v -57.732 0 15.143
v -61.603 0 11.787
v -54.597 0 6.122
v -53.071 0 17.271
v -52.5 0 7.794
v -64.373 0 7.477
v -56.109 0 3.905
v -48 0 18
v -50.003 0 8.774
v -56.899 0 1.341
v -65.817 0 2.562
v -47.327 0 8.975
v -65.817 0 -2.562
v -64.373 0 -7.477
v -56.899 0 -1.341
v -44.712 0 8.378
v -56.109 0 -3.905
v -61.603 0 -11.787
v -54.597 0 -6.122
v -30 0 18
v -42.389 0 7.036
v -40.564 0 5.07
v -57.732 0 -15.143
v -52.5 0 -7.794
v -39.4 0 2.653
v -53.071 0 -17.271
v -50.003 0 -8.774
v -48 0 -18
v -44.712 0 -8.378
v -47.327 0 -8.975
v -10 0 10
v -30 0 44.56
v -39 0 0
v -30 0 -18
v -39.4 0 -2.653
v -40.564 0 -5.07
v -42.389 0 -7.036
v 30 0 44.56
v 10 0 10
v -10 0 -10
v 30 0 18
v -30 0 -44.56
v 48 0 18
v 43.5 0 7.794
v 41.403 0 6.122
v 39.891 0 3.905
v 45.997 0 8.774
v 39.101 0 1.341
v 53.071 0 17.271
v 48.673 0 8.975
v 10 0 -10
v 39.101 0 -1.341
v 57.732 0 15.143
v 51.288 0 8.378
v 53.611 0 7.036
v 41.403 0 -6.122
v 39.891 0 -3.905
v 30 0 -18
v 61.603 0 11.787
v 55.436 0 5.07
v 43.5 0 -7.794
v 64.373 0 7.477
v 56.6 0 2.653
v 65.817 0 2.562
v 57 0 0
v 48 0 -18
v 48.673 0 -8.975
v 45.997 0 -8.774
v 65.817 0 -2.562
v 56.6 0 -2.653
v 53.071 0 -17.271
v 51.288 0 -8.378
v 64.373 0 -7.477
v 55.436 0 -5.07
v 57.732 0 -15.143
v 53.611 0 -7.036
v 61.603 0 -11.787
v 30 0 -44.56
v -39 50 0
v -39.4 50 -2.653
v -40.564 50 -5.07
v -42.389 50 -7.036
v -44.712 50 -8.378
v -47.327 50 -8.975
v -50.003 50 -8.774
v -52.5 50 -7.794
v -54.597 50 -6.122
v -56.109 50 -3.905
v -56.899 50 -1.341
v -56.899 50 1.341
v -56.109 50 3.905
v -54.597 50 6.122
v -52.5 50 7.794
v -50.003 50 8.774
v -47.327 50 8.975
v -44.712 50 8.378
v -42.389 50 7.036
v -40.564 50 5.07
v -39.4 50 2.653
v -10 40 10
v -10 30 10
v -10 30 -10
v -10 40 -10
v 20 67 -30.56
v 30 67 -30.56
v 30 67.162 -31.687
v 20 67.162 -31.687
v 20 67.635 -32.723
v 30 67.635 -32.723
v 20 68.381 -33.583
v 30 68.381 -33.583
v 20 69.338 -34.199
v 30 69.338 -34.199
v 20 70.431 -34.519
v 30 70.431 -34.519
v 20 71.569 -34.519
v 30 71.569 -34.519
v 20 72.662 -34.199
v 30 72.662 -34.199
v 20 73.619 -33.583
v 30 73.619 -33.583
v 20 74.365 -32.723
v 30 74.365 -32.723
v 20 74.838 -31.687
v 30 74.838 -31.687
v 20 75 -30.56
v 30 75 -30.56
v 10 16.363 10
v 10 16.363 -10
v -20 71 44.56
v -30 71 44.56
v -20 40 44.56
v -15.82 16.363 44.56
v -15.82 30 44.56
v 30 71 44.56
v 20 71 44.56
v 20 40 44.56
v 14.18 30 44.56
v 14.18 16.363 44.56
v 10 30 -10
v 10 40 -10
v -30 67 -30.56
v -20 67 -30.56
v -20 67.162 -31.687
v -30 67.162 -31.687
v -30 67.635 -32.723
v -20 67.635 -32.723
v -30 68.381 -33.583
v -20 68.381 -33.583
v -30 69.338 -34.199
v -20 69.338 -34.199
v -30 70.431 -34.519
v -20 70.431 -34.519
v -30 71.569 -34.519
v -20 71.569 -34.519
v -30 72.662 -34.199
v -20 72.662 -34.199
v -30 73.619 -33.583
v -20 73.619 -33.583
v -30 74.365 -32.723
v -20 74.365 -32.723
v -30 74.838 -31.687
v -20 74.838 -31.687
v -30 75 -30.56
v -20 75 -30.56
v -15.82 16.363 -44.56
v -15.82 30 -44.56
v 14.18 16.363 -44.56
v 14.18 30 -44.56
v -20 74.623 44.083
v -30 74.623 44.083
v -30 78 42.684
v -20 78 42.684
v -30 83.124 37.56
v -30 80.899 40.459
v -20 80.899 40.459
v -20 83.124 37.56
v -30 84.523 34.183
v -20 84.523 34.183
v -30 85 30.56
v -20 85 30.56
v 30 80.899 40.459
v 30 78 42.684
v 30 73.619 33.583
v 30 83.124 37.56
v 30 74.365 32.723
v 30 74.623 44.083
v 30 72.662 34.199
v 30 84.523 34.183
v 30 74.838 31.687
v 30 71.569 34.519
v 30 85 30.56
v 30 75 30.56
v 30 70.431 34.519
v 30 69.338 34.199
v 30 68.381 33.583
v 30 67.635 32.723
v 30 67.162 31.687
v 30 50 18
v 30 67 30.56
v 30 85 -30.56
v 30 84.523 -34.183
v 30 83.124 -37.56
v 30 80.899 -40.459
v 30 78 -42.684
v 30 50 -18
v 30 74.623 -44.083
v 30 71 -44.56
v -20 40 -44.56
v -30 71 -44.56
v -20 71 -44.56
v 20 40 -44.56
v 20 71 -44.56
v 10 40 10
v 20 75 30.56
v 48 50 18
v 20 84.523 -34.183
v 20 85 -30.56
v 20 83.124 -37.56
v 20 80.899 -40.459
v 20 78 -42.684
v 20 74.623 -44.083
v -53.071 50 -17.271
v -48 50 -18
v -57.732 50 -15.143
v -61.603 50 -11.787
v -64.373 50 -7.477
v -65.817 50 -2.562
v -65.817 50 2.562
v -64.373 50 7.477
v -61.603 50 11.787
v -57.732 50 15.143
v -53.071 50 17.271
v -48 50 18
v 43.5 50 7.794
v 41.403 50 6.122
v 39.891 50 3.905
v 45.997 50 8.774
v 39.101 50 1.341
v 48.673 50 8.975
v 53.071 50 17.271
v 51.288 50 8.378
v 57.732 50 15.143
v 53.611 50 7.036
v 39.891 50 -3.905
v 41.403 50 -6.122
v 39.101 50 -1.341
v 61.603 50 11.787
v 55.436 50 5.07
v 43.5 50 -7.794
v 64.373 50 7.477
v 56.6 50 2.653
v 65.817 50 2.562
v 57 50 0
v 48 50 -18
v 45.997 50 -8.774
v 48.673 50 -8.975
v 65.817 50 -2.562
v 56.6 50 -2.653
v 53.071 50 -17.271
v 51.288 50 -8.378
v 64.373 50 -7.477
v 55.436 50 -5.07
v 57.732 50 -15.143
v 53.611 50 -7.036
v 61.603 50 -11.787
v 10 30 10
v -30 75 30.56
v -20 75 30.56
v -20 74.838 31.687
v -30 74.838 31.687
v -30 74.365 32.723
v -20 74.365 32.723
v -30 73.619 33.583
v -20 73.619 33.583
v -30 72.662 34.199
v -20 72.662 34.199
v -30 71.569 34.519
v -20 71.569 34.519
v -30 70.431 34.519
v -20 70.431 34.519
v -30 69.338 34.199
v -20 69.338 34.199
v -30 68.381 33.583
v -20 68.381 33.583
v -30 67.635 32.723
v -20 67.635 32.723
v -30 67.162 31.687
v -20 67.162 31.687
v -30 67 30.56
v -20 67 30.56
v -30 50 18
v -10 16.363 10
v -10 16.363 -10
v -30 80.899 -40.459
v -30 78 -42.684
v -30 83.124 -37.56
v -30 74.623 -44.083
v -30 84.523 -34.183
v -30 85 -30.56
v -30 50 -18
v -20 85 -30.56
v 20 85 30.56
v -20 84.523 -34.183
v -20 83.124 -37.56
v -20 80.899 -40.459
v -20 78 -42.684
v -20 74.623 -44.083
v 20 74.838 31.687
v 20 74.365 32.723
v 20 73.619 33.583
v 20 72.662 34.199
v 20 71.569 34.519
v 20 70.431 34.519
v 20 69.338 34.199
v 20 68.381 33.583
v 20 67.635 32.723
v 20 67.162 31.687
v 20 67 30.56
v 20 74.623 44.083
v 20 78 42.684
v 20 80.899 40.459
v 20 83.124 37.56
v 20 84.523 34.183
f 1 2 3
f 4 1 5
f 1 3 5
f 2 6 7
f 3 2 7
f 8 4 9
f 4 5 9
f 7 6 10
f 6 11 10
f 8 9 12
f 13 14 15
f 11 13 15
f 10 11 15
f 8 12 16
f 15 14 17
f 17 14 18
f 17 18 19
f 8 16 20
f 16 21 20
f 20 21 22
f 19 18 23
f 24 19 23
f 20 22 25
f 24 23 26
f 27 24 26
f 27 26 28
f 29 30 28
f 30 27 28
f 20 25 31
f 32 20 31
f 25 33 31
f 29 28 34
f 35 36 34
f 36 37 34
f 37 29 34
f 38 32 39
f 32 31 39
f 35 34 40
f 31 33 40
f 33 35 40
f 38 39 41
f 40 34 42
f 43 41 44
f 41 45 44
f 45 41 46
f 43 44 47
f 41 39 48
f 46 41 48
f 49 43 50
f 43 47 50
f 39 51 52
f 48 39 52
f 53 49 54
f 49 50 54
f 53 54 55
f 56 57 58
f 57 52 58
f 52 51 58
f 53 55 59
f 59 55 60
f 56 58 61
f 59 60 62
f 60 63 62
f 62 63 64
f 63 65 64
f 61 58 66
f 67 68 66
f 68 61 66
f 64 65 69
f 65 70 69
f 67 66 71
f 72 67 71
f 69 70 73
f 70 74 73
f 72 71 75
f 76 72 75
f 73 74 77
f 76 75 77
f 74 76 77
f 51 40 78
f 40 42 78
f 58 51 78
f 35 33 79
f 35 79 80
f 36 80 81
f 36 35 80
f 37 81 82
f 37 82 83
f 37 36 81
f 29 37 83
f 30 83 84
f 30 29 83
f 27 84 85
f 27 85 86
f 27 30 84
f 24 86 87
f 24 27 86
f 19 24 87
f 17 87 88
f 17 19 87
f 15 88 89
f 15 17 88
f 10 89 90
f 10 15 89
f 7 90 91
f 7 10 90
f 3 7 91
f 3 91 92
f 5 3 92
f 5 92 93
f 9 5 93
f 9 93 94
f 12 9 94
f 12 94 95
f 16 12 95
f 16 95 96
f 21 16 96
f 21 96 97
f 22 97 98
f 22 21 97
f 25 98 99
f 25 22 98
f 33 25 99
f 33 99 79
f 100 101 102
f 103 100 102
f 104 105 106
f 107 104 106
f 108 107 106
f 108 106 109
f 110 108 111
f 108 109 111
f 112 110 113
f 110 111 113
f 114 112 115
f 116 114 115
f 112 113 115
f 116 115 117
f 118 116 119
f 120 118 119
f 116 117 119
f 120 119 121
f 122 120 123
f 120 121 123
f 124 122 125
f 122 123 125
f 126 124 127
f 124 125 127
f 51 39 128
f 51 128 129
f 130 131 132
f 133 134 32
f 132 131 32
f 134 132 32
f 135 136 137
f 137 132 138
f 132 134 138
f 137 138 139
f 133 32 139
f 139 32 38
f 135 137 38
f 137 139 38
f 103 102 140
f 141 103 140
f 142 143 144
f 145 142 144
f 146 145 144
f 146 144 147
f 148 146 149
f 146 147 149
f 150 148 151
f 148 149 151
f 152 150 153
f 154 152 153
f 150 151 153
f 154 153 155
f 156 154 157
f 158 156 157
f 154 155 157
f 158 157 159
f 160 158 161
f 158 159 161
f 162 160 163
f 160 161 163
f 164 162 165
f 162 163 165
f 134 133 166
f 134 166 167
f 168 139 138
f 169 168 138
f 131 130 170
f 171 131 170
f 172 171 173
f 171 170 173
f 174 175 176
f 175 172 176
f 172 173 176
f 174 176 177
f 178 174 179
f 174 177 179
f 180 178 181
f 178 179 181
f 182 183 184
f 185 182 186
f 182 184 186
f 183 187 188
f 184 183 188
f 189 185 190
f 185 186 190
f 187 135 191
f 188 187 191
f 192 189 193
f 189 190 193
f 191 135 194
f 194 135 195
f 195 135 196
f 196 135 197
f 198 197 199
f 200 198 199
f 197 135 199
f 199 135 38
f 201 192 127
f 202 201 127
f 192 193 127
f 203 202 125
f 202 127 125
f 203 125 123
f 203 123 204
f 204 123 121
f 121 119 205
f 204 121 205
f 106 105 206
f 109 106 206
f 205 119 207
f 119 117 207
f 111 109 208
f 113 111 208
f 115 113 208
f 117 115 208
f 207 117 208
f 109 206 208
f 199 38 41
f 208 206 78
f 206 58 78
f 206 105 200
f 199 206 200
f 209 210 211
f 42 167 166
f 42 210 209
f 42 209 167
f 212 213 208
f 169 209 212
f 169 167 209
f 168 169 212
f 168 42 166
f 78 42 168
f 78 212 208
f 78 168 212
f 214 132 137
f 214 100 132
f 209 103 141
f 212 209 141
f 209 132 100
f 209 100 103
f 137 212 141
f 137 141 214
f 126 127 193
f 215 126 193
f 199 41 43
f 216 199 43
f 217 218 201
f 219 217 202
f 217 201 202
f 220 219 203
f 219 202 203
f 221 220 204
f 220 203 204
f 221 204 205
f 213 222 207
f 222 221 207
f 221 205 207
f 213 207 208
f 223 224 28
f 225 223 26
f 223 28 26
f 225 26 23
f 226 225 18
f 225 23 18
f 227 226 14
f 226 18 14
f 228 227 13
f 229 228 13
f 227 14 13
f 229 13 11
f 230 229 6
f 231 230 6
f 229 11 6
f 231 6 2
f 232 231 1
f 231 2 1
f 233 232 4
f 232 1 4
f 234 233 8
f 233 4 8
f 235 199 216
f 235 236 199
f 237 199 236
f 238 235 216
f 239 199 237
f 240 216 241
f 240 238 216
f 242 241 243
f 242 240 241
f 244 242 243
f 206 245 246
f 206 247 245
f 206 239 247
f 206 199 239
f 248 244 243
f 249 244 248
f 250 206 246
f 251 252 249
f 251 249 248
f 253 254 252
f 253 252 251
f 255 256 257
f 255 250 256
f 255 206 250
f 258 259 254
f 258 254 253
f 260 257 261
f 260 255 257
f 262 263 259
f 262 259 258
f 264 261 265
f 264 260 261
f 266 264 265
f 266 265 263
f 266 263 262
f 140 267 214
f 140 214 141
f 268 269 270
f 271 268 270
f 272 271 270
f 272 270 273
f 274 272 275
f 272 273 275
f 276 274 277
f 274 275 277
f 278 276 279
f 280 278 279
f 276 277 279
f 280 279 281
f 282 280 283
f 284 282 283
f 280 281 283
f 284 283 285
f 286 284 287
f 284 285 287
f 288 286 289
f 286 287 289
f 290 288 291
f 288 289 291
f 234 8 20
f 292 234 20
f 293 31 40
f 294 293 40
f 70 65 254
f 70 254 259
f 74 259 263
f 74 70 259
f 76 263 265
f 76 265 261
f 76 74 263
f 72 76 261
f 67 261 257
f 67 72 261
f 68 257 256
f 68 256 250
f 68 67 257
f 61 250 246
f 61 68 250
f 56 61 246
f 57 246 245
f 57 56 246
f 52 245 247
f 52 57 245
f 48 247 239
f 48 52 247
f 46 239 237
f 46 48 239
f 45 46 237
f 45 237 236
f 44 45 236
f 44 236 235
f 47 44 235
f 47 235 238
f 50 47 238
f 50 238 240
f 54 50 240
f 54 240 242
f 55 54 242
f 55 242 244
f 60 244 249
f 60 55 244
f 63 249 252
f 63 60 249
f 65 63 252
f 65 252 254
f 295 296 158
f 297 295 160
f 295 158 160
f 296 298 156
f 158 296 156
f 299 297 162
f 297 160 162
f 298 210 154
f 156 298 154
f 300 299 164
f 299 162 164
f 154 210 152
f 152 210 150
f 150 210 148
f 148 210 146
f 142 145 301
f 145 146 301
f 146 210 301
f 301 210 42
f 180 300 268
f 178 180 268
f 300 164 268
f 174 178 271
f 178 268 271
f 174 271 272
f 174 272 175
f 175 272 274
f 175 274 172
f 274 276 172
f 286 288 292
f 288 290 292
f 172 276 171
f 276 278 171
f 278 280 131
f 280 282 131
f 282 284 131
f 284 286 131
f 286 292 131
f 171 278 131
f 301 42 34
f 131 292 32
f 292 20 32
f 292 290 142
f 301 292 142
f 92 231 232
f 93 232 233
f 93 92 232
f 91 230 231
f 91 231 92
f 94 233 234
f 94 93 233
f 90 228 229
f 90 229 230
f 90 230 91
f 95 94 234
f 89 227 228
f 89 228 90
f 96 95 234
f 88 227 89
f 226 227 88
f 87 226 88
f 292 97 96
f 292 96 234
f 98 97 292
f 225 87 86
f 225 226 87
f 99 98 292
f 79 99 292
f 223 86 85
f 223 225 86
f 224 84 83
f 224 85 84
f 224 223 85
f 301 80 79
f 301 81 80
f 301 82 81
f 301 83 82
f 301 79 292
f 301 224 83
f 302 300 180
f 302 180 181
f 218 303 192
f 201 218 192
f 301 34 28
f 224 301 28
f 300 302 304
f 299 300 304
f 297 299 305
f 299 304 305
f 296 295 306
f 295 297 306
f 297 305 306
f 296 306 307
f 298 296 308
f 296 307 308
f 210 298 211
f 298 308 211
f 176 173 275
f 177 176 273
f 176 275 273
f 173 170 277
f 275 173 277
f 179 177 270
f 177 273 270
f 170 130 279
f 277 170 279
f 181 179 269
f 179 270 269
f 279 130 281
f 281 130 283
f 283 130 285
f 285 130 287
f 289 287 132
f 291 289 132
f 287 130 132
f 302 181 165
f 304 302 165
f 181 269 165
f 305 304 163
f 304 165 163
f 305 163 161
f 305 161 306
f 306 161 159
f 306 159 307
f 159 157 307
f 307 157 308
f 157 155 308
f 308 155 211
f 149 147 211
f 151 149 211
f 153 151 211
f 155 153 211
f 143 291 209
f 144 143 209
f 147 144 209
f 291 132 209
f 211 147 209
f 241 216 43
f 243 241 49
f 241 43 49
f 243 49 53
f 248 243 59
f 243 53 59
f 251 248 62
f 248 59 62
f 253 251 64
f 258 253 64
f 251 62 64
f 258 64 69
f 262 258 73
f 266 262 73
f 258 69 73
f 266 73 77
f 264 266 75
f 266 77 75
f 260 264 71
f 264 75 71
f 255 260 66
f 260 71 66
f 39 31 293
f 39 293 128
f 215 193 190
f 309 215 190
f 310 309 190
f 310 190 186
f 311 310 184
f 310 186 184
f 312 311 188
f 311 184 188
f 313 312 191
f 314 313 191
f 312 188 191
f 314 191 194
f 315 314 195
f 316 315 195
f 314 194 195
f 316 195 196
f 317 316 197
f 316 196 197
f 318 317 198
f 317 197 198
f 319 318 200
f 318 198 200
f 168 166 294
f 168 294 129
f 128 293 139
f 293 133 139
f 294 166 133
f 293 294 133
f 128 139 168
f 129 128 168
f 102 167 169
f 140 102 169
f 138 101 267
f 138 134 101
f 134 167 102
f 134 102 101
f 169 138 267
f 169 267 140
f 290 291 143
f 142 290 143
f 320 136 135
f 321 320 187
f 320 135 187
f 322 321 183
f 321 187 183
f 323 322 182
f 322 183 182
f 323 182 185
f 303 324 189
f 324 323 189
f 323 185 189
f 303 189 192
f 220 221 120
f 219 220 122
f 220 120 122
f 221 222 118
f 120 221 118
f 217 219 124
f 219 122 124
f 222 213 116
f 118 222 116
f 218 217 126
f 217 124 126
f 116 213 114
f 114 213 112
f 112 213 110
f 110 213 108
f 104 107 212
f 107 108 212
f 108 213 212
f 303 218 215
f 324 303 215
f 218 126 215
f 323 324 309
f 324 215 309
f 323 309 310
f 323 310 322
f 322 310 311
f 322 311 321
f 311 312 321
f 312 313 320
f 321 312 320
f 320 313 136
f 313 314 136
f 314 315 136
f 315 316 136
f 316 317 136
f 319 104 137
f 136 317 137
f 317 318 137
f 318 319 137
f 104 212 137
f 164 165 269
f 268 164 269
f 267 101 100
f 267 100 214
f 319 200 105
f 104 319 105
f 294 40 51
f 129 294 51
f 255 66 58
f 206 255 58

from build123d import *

# Parameters (mm, degrees)
SKETCH1_W             = 10
SKETCH1_H             = 89.12
BOSS_EXTRUDE1_DEPTH   = 85
BOSS_EXTRUDE1_2_DEPTH = 85
SKETCH1_5_W           = 40
SKETCH1_5_H           = 89.12
SKETCH1_5_W_2         = 20
SKETCH1_5_H_2         = 20
BOSS_EXTRUDE2_DEPTH   = 40
SKETCH1_6_R           = 9
BOSS_EXTRUDE3_DEPTH   = 50
CUT_EXTRUDE1_DEPTH    = 43
CUT_EXTRUDE2_DEPTH    = 86
SKETCH4_W             = 30
SKETCH4_H             = 13.637460926
CUT_EXTRUDE3_DEPTH    = 103


with BuildPart() as part:
    # Sketch1 → Boss-Extrude1 (new body)
    with BuildSketch(Plane(origin=(0, 0, 0), x_dir=(1, 0, 0), z_dir=(0, 1, 0))):
        with Locations((25, 0)):
            Rectangle(SKETCH1_W, SKETCH1_H)
    extrude(amount=BOSS_EXTRUDE1_DEPTH)



with BuildPart() as body_2:
    # Sketch1 → Boss-Extrude1 2 (new body)
    with BuildSketch(Plane(origin=(0, 0, 0), x_dir=(1, 0, 0), z_dir=(0, 1, 0))):
        with Locations((-25, 0)):
            Rectangle(SKETCH1_W, SKETCH1_H)
    extrude(amount=BOSS_EXTRUDE1_2_DEPTH)


with BuildPart() as part_1:
    add(part.part)

    add(body_2.part)  # Boss-Extrude2 merges body 2
    # Sketch1<5> → Boss-Extrude2 (add)
    with BuildSketch(Plane(origin=(0, 0, 0), x_dir=(1, 0, 0), z_dir=(0, 1, 0))):
        Rectangle(SKETCH1_5_W, SKETCH1_5_H)
        Rectangle(SKETCH1_5_W_2, SKETCH1_5_H_2, mode=Mode.SUBTRACT)
    extrude(amount=BOSS_EXTRUDE2_DEPTH)

    # Sketch1<6> → Boss-Extrude3 (add)
    # profile 1 of 2: a face of its own
    with BuildSketch(Plane(origin=(0, 0, 0), x_dir=(1, 0, 0), z_dir=(0, 1, 0))):
        with BuildLine():
            Line((30, 18), (30, -18))
            Line((30, -18), (48, -18))
            ThreePointArc((48, -18), (66, 0), (48, 18))
            Line((48, 18), (30, 18))
        make_face()
        with Locations((48, 0)):
            Circle(SKETCH1_6_R, mode=Mode.SUBTRACT)
    # profile 2 of 2: a face of its own
    with BuildSketch(Plane(origin=(0, 0, 0), x_dir=(1, 0, 0), z_dir=(0, 1, 0))):
        with BuildLine():
            Line((-48, -18), (-30, -18))
            Line((-30, -18), (-30, 18))
            Line((-30, 18), (-48, 18))
            ThreePointArc((-48, 18), (-66, 0), (-48, -18))
        make_face()
        with Locations((-48, 0)):
            Circle(SKETCH1_6_R, mode=Mode.SUBTRACT)
    extrude(amount=BOSS_EXTRUDE3_DEPTH)

    # Sketch2 → Cut-Extrude1 (cut, symmetric)
    with BuildSketch(Plane(origin=(0, 0, 0), x_dir=(0, 0, -1), z_dir=(1, 0, 0))):
        with BuildLine():
            ThreePointArc((-30.56, 75), (-34.56, 71), (-30.56, 67))
            Line((-30.56, 67), (-17.143592135, 67))
            Line((-17.143592135, 67), (17.143592135, 67))
            Line((17.143592135, 67), (30.56, 67))
            ThreePointArc((30.56, 67), (34.56, 71), (30.56, 75))
            Line((30.56, 75), (17.143592135, 75))
            Line((17.143592135, 75), (-17.143592135, 75))
            Line((-17.143592135, 75), (-30.56, 75))
        make_face()
    extrude(amount=CUT_EXTRUDE1_DEPTH, both=True, mode=Mode.SUBTRACT)

    # Sketch3 → Cut-Extrude2 (cut)
    with BuildSketch(Plane(origin=(30, 0, 0), x_dir=(0, 0, -1), z_dir=(1, 0, 0))):
        with BuildLine():
            ThreePointArc((-44.56, 71), (-40.459494937, 80.899494937), (-30.56, 85))
            Line((-30.56, 85), (-44.56, 85))
            Line((-44.56, 85), (-44.56, 71))
        make_face()
        with BuildLine():
            Line((44.56, 85), (30.56, 85))
            ThreePointArc((30.56, 85), (40.459494937, 80.899494937), (44.56, 71))
            Line((44.56, 71), (44.56, 85))
        make_face()
    extrude(amount=-CUT_EXTRUDE2_DEPTH, mode=Mode.SUBTRACT)

    # Sketch4 → Cut-Extrude3 (cut)
    with BuildSketch(Plane.XY.offset(44.56)):
        with Locations((-0.820162859, 23.181269537)):
            Rectangle(SKETCH4_W, SKETCH4_H)
    extrude(amount=-CUT_EXTRUDE3_DEPTH, mode=Mode.SUBTRACT)


solid = part_1.part
